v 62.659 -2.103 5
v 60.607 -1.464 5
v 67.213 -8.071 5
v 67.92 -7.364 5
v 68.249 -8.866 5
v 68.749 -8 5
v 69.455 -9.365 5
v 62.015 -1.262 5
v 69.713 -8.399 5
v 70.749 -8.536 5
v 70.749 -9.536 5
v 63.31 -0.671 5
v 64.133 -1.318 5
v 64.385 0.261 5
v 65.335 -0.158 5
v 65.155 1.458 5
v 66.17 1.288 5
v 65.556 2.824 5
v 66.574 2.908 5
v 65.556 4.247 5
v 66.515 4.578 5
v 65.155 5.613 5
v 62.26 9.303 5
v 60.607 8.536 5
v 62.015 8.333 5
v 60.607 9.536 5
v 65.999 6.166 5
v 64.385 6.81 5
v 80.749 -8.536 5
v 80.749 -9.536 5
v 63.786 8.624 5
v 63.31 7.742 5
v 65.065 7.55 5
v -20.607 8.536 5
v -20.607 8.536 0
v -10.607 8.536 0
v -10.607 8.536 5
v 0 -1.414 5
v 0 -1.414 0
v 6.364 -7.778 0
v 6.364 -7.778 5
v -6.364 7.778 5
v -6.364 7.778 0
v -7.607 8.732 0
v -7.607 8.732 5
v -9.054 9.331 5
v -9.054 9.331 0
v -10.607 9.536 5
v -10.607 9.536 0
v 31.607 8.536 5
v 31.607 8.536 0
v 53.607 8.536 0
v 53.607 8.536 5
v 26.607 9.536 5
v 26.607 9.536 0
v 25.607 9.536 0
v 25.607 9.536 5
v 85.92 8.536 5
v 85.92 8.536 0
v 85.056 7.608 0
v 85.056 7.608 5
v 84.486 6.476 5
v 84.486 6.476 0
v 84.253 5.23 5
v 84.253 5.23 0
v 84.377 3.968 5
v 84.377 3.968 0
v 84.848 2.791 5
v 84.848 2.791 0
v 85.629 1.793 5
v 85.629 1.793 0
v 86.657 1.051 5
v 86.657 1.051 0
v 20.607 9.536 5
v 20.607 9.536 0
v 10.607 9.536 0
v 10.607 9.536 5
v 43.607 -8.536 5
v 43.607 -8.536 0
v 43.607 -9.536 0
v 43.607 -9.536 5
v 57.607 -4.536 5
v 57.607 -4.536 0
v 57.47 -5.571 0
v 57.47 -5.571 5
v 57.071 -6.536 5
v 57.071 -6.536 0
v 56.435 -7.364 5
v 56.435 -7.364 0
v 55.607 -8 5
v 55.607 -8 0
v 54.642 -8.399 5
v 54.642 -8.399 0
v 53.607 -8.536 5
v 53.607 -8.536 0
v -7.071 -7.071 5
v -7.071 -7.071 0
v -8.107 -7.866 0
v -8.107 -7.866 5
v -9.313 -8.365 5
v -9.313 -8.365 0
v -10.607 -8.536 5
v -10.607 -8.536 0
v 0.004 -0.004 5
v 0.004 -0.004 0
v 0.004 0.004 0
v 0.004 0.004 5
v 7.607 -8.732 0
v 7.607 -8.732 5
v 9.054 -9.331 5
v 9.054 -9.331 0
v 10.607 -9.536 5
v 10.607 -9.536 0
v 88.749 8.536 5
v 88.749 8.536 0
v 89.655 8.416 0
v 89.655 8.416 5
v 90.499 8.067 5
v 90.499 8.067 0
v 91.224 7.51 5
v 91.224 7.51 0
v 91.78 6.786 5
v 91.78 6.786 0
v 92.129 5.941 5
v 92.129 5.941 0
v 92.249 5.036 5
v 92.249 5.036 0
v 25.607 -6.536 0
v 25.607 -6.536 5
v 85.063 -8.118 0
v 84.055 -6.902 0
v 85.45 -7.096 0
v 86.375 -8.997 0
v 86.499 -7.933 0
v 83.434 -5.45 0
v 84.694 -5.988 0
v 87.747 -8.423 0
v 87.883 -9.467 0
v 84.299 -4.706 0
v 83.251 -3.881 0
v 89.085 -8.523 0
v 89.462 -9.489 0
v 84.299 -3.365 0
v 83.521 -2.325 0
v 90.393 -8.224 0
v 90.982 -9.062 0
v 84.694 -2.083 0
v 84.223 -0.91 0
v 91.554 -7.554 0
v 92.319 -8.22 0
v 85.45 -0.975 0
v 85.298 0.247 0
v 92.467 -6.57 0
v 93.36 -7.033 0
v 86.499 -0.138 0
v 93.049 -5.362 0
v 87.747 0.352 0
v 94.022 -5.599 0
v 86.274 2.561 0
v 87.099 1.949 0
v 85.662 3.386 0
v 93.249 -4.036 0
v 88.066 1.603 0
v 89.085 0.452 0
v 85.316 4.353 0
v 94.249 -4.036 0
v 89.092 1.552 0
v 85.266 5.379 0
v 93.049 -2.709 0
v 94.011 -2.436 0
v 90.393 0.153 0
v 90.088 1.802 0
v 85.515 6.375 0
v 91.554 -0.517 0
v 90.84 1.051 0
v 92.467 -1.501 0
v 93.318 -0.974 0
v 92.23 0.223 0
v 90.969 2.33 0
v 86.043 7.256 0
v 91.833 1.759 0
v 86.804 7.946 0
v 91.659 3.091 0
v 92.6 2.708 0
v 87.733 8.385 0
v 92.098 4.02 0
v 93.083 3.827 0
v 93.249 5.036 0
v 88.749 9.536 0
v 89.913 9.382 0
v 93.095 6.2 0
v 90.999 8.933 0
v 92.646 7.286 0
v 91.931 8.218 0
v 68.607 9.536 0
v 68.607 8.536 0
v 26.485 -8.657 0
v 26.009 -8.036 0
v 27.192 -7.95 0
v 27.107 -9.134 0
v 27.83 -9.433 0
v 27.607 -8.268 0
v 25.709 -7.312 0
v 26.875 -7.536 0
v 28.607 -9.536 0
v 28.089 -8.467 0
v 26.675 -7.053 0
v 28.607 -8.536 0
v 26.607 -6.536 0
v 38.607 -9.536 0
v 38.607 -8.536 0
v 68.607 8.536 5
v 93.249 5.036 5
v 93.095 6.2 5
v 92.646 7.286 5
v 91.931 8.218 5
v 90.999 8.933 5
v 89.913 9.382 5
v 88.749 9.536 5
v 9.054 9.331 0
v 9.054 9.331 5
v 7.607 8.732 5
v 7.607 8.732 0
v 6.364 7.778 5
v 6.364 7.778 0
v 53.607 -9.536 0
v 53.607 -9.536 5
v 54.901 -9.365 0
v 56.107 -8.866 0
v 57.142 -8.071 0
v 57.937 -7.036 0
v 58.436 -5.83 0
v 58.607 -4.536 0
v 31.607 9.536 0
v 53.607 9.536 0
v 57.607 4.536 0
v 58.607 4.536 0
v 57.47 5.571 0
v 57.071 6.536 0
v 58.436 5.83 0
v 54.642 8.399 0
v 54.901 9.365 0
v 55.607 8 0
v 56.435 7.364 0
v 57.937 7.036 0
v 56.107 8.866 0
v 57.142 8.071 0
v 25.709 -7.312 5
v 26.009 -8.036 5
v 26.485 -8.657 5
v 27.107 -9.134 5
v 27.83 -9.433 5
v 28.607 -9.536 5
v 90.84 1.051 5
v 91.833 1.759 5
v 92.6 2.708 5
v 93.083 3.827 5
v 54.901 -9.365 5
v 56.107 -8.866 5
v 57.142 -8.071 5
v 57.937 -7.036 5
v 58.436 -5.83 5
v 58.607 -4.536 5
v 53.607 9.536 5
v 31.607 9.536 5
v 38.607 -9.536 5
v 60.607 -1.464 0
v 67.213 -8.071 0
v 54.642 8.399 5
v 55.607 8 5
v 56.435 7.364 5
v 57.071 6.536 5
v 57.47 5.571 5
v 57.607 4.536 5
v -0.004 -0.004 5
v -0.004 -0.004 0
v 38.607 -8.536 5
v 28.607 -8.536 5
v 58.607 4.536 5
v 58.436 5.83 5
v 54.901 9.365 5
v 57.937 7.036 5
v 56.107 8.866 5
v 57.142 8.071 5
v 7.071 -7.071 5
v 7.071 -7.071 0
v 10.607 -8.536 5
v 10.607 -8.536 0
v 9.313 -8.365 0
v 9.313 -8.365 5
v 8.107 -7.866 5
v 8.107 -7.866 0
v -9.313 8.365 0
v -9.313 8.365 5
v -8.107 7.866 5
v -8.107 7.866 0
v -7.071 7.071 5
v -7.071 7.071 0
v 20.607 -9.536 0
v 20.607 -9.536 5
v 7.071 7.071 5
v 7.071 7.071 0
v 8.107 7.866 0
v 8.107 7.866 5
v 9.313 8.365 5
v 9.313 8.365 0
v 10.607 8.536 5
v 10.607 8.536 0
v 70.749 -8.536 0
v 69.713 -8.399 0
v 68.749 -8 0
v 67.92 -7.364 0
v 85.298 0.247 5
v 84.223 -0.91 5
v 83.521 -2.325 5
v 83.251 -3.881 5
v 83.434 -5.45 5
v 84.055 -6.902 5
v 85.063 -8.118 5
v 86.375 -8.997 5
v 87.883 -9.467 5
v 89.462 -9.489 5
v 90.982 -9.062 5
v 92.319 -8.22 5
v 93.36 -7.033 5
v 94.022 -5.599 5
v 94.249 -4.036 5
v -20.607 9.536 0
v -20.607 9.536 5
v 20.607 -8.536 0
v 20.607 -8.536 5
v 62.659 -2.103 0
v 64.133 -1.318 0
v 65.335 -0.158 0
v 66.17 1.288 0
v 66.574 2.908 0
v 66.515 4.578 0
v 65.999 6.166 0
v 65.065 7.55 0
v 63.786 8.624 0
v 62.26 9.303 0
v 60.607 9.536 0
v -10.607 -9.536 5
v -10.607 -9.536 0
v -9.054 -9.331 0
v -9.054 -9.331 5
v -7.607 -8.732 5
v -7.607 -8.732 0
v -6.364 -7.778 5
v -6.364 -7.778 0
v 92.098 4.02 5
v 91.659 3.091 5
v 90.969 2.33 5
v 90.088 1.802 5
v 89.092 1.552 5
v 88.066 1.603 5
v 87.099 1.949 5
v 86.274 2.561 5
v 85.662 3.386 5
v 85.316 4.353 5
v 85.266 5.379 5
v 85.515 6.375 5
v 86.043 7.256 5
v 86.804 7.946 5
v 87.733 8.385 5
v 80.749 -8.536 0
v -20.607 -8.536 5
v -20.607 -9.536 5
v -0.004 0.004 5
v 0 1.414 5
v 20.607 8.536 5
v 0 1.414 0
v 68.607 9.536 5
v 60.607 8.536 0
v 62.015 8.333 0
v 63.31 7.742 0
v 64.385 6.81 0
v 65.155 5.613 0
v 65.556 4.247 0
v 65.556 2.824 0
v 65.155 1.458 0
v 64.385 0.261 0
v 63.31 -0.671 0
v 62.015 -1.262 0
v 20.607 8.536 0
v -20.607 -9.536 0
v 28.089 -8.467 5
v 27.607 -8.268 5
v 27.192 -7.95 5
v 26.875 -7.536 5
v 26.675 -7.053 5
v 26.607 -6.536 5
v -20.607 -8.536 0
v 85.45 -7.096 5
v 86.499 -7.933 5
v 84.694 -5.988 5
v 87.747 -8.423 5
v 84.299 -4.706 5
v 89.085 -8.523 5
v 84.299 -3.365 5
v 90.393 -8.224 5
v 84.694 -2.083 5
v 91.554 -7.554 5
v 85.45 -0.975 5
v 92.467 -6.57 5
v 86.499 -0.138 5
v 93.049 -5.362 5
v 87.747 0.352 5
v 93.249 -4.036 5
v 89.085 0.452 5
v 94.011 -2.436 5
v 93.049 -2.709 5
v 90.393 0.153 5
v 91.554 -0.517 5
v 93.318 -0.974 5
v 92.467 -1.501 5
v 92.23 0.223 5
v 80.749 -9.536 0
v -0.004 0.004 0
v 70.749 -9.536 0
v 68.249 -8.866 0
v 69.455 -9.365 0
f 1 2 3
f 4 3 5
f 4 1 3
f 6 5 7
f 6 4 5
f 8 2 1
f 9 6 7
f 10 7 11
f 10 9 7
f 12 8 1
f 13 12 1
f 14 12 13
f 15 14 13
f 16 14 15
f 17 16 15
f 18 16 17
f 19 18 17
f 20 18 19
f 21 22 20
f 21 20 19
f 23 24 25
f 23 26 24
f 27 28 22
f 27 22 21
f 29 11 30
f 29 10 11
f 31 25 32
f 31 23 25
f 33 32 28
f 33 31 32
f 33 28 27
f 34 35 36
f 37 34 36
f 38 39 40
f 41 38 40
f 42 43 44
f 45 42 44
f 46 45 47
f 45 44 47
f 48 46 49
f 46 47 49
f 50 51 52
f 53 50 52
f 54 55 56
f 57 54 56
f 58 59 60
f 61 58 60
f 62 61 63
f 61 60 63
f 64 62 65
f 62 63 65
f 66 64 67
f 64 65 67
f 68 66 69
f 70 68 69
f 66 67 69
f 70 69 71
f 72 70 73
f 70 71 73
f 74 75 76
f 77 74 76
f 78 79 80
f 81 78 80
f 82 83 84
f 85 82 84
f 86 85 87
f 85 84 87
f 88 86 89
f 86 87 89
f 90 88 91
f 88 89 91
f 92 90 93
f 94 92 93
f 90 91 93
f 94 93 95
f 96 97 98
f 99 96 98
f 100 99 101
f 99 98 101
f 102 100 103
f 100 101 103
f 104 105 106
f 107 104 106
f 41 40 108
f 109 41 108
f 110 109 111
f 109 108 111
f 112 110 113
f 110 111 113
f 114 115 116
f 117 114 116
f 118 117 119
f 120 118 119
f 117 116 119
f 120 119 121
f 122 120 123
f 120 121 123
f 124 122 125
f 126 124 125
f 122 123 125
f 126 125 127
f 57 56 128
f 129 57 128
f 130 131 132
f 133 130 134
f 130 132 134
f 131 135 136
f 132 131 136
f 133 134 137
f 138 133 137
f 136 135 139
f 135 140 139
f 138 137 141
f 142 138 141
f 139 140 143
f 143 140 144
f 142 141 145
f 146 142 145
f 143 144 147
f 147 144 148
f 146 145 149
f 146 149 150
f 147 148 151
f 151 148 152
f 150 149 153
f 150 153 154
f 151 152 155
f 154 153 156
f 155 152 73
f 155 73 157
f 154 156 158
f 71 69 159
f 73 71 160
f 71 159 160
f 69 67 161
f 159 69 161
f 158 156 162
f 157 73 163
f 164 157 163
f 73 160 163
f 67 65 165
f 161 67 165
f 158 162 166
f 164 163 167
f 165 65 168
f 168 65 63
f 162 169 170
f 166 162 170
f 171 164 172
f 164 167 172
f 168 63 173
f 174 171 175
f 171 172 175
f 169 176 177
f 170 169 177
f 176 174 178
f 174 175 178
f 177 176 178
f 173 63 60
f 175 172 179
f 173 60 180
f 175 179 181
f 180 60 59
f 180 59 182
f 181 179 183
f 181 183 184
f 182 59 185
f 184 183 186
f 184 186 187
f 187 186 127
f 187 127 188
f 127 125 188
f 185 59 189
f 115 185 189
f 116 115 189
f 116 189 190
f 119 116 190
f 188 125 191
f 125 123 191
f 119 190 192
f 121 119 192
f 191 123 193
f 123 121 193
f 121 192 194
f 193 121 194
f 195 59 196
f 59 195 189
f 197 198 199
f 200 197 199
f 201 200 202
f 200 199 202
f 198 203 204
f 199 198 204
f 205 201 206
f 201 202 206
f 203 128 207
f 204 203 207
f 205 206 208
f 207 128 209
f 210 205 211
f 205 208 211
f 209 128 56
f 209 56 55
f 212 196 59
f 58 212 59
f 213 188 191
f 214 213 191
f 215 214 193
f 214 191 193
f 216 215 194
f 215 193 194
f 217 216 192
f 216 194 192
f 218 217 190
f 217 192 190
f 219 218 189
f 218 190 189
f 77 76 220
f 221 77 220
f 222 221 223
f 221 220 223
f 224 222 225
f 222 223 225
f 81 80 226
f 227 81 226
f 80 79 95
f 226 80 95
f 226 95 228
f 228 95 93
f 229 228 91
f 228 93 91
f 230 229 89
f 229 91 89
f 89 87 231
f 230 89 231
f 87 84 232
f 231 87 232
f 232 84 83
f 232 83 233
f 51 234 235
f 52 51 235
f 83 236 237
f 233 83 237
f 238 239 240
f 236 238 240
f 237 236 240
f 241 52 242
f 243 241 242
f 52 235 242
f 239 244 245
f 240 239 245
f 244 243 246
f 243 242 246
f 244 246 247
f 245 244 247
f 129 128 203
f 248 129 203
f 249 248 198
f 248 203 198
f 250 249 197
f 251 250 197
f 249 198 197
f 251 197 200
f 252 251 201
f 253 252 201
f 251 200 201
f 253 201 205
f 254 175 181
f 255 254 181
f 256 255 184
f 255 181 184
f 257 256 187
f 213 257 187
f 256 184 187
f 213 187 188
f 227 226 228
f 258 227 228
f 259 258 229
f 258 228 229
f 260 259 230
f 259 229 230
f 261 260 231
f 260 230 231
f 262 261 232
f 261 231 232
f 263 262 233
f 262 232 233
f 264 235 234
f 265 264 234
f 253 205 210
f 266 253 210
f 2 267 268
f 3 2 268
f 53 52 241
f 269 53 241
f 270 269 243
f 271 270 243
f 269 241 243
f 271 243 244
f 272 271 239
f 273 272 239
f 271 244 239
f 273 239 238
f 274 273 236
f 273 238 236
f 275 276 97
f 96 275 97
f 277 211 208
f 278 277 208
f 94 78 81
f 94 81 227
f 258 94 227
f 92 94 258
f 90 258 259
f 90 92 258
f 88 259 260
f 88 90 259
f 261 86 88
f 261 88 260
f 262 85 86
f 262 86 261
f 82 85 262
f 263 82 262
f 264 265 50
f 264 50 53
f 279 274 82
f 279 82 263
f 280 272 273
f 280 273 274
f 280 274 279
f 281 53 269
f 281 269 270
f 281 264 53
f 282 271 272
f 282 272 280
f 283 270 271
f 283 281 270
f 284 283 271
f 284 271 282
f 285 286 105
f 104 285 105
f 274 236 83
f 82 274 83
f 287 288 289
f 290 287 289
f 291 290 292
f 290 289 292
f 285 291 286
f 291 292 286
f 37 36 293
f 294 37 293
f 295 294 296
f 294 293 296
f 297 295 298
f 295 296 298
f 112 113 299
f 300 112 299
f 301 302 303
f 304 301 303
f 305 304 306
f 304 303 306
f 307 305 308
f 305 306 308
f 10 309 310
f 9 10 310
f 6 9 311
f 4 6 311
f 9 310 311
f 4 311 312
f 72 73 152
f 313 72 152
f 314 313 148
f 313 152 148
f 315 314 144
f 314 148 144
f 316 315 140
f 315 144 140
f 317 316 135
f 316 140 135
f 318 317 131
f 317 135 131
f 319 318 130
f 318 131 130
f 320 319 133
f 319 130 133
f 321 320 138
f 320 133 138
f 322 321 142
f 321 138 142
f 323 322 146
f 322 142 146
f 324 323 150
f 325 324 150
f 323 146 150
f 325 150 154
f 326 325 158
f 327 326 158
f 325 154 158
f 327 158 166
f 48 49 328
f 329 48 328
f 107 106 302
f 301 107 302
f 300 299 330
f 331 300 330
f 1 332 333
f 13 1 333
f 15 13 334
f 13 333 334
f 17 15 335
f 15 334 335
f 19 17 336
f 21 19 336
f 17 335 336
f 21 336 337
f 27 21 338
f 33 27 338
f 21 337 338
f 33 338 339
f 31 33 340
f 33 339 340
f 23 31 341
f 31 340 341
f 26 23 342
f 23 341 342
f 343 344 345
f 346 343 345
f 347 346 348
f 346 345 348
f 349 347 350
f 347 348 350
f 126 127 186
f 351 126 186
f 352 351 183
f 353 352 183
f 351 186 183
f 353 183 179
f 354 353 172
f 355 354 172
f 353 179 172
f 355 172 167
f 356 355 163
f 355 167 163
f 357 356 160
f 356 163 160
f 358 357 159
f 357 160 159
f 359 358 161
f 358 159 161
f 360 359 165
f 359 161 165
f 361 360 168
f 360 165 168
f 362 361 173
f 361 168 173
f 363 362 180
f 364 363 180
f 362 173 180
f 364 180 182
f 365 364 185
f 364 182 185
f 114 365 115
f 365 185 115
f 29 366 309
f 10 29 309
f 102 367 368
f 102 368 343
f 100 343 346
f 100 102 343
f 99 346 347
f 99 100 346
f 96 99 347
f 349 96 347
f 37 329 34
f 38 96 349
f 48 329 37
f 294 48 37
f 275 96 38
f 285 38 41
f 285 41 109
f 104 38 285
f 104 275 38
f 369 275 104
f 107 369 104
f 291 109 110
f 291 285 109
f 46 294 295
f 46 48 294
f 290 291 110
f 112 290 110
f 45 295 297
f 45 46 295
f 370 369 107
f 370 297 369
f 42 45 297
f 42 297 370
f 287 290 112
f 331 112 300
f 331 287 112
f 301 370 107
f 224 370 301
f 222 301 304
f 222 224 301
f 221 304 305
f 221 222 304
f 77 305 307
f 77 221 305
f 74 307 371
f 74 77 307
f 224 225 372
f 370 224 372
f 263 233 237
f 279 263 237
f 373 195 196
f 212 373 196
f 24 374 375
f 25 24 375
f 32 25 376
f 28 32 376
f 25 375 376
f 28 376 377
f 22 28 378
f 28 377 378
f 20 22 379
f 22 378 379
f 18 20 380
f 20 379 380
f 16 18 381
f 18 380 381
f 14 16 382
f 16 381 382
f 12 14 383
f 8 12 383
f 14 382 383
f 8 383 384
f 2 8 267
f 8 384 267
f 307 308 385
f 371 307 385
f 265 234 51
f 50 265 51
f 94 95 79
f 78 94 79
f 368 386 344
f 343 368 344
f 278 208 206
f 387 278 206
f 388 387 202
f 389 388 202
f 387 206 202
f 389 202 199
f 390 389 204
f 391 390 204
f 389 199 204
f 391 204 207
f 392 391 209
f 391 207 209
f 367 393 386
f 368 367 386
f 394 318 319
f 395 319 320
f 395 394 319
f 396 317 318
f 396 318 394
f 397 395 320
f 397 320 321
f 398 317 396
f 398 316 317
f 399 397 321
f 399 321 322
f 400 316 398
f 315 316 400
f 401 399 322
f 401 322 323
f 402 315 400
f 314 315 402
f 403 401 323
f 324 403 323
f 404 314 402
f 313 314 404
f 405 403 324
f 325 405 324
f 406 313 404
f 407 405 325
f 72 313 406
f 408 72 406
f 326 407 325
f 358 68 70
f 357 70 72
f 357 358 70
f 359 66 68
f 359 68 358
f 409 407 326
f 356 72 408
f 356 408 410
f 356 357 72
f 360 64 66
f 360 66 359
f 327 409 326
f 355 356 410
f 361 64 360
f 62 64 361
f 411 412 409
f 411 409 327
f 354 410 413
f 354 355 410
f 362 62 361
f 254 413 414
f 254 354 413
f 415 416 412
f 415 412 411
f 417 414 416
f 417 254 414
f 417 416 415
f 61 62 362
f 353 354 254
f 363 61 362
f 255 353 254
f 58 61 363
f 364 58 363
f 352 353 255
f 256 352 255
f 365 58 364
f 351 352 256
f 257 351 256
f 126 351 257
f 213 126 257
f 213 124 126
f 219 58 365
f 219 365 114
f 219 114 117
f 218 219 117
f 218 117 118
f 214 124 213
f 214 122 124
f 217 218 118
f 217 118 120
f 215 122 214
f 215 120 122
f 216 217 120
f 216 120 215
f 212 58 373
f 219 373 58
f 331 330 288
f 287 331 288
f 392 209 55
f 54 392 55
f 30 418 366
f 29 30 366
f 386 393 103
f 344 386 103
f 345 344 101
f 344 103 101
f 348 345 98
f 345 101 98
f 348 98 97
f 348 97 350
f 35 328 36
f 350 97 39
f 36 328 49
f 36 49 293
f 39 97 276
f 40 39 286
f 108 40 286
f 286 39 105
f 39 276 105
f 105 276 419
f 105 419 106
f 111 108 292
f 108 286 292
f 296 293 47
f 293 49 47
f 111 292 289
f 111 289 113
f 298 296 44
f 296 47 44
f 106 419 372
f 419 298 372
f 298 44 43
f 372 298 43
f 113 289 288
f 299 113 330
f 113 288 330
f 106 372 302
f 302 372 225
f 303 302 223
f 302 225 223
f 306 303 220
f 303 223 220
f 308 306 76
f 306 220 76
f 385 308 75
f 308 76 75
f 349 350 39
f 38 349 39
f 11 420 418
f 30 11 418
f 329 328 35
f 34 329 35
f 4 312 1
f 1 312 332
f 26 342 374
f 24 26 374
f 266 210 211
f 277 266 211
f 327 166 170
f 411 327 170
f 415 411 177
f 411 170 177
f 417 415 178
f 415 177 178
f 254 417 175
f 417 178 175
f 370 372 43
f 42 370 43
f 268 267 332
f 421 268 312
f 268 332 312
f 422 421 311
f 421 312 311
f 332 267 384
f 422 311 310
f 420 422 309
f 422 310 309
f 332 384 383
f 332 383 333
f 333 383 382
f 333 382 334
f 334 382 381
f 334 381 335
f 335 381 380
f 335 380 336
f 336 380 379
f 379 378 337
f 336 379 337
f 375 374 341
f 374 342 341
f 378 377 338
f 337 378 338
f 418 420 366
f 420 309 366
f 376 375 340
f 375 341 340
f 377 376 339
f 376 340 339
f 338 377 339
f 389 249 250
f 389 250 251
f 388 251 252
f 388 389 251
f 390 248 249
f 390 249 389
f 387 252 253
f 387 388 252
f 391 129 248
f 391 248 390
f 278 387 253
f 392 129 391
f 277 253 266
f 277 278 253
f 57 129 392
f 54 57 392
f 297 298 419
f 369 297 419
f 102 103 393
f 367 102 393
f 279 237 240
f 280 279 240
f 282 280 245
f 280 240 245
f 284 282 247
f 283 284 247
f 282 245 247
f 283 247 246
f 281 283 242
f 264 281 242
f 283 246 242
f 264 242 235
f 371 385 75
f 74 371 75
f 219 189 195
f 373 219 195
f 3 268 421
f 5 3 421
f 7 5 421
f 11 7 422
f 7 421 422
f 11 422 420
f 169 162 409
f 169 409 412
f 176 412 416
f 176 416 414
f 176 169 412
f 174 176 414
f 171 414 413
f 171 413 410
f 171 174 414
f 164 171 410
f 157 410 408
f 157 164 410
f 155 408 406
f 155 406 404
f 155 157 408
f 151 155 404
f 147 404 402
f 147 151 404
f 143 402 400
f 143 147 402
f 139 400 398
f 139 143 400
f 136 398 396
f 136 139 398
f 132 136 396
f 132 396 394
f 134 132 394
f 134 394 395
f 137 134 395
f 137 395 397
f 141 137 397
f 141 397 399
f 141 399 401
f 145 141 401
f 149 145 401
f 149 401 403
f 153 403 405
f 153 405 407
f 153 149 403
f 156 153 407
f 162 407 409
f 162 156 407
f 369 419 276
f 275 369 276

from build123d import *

# Parameters (mm, degrees)
F0_R     = 4.5
F1_DEPTH = 5


with BuildPart() as f1:
    # F0 (on Top) → F1 (new body)
    with BuildSketch(Plane.XY):
        with BuildLine():
            Line((-0.004, 0.004), (0, 0))
            Line((0, 0), (0.004, 0.004))
            Line((0.004, 0.004), (7.071068, 7.071068))
            ThreePointArc((7.071068, 7.071068), (8.693185, 8.154932), (10.606602, 8.535534))
            Line((10.606602, 8.535534), (20.606602, 8.535534))
            Line((20.606602, 8.535534), (20.606602, 9.535534))
            Line((20.606602, 9.535534), (10.606602, 9.535534))
            ThreePointArc((10.606602, 9.535534), (8.310501, 9.078811), (6.363961, 7.778175))
            Line((6.363961, 7.778175), (0, 1.414214))
            Line((0, 1.414214), (-6.363961, 7.778175))
            ThreePointArc((-6.363961, 7.778175), (-8.310501, 9.078811), (-10.606602, 9.535534))
            Line((-10.606602, 9.535534), (-20.606602, 9.535534))
            Line((-20.606602, 9.535534), (-20.606602, 8.535534))
            Line((-20.606602, 8.535534), (-10.606602, 8.535534))
            ThreePointArc((-10.606602, 8.535534), (-8.693185, 8.154932), (-7.071068, 7.071068))
            Line((-7.071068, 7.071068), (-0.004, 0.004))
        make_face()
        with BuildLine():
            Line((0.004, -0.004), (0, 0))
            Line((0, 0), (-0.004, -0.004))
            Line((-0.004, -0.004), (-7.071068, -7.071068))
            ThreePointArc((-7.071068, -7.071068), (-8.693185, -8.154932), (-10.606602, -8.535534))
            Line((-10.606602, -8.535534), (-20.606602, -8.535534))
            Line((-20.606602, -8.535534), (-20.606602, -9.535534))
            Line((-20.606602, -9.535534), (-10.606602, -9.535534))
            ThreePointArc((-10.606602, -9.535534), (-8.310501, -9.078811), (-6.363961, -7.778175))
            Line((-6.363961, -7.778175), (0, -1.414214))
            Line((0, -1.414214), (6.363961, -7.778175))
            ThreePointArc((6.363961, -7.778175), (8.310501, -9.078811), (10.606602, -9.535534))
            Line((10.606602, -9.535534), (20.606602, -9.535534))
            Line((20.606602, -9.535534), (20.606602, -8.535534))
            Line((20.606602, -8.535534), (10.606602, -8.535534))
            ThreePointArc((10.606602, -8.535534), (8.693185, -8.154932), (7.071068, -7.071068))
            Line((7.071068, -7.071068), (0.004, -0.004))
        make_face()
        Polygon((0.004, 0.004), (0, 0), (0.004, -0.004), align=None)
        Polygon((-0.004, -0.004), (0, 0), (-0.004, 0.004), align=None)
        with BuildLine():
            Line((26.606602, 9.535534), (25.606602, 9.535534))
            Line((25.606602, 9.535534), (25.606602, -6.535534))
            ThreePointArc((25.606602, -6.535534), (26.485281, -8.656854), (28.606602, -9.535534))
            Line((28.606602, -9.535534), (38.606602, -9.535534))
            Line((38.606602, -9.535534), (38.606602, -8.535534))
            Line((38.606602, -8.535534), (28.606602, -8.535534))
            ThreePointArc((28.606602, -8.535534), (27.192388, -7.949747), (26.606602, -6.535534))
            Line((26.606602, -6.535534), (26.606602, 9.535534))
        make_face()
        with BuildLine():
            Line((43.606602, -8.535534), (43.606602, -9.535534))
            Line((43.606602, -9.535534), (53.606602, -9.535534))
            ThreePointArc((53.606602, -9.535534), (57.142136, -8.071068), (58.606602, -4.535534))
            Line((58.606602, -4.535534), (58.606602, 4.535534))
            ThreePointArc((58.606602, 4.535534), (57.142136, 8.071068), (53.606602, 9.535534))
            Line((53.606602, 9.535534), (31.606602, 9.535534))
            Line((31.606602, 9.535534), (31.606602, 8.535534))
            Line((31.606602, 8.535534), (53.606602, 8.535534))
            ThreePointArc((53.606602, 8.535534), (56.435029, 7.363961), (57.606602, 4.535534))
            Line((57.606602, 4.535534), (57.606602, -4.535534))
            ThreePointArc((57.606602, -4.535534), (56.435029, -7.363961), (53.606602, -8.535534))
            Line((53.606602, -8.535534), (43.606602, -8.535534))
        make_face()
        with BuildLine():
            ThreePointArc((60.606602, 8.535534), (65.606602, 3.535534), (60.606602, -1.464466))
            Line((60.606602, -1.464466), (67.213203, -8.071068))
            ThreePointArc((67.213203, -8.071068), (68.83532, -9.154932), (70.748737, -9.535534))
            Line((70.748737, -9.535534), (80.748737, -9.535534))
            Line((80.748737, -9.535534), (80.748737, -8.535534))
            Line((80.748737, -8.535534), (70.748737, -8.535534))
            ThreePointArc((70.748737, -8.535534), (69.218004, -8.231052), (67.92031, -7.363961))
            Line((67.92031, -7.363961), (62.658905, -2.102556))
            ThreePointArc((62.658905, -2.102556), (66.515431, 4.577518), (60.606602, 9.535534))
            Line((60.606602, 9.535534), (60.606602, 8.535534))
        make_face()
        with BuildLine():
            Line((68.606602, 8.535534), (85.92031, 8.535534))
            ThreePointArc((85.92031, 8.535534), (87.248737, 9.278175), (88.748737, 9.535534))
            Line((88.748737, 9.535534), (68.606602, 9.535534))
            Line((68.606602, 9.535534), (68.606602, 8.535534))
        make_face()
        with BuildLine():
            ThreePointArc((86.657062, 1.051203), (88.748737, 1.464466), (90.840413, 1.051203))
            ThreePointArc((90.840413, 1.051203), (92.599876, 2.707717), (93.248737, 5.035534))
            ThreePointArc((93.248737, 5.035534), (91.930718, 8.217514), (88.748737, 9.535534))
            Line((88.748737, 9.535534), (88.748737, 8.535534))
            Line((88.748737, 8.535534), (85.92031, 8.535534))
            ThreePointArc((85.92031, 8.535534), (84.270383, 4.594688), (86.657062, 1.051203))
        make_face()
        with BuildLine():
            ThreePointArc((92.248737, 5.035534), (86.273864, 2.56066), (88.748737, 8.535534))
            ThreePointArc((88.748737, 8.535534), (91.223611, 7.510408), (92.248737, 5.035534))
        make_face(mode=Mode.SUBTRACT)
        with BuildLine():
            ThreePointArc((88.748737, 9.535534), (87.248737, 9.278175), (85.92031, 8.535534))
            Line((85.92031, 8.535534), (88.748737, 8.535534))
            Line((88.748737, 8.535534), (88.748737, 9.535534))
        make_face()
        with BuildLine():
            ThreePointArc((86.657062, 1.051203), (88.748737, 0.535534), (90.840413, 1.051203))
            ThreePointArc((90.840413, 1.051203), (88.748737, 1.464466), (86.657062, 1.051203))
        make_face()
        with BuildLine():
            ThreePointArc((86.657062, 1.051203), (85.687219, -8.604681), (94.248737, -4.035534))
            ThreePointArc((94.248737, -4.035534), (93.317885, -0.974016), (90.840413, 1.051203))
            ThreePointArc((90.840413, 1.051203), (88.748737, 0.535534), (86.657062, 1.051203))
        make_face()
        with Locations((88.748737, -4.035534)):
            Circle(F0_R, mode=Mode.SUBTRACT)
    extrude(amount=F1_DEPTH)


solid = f1.part
